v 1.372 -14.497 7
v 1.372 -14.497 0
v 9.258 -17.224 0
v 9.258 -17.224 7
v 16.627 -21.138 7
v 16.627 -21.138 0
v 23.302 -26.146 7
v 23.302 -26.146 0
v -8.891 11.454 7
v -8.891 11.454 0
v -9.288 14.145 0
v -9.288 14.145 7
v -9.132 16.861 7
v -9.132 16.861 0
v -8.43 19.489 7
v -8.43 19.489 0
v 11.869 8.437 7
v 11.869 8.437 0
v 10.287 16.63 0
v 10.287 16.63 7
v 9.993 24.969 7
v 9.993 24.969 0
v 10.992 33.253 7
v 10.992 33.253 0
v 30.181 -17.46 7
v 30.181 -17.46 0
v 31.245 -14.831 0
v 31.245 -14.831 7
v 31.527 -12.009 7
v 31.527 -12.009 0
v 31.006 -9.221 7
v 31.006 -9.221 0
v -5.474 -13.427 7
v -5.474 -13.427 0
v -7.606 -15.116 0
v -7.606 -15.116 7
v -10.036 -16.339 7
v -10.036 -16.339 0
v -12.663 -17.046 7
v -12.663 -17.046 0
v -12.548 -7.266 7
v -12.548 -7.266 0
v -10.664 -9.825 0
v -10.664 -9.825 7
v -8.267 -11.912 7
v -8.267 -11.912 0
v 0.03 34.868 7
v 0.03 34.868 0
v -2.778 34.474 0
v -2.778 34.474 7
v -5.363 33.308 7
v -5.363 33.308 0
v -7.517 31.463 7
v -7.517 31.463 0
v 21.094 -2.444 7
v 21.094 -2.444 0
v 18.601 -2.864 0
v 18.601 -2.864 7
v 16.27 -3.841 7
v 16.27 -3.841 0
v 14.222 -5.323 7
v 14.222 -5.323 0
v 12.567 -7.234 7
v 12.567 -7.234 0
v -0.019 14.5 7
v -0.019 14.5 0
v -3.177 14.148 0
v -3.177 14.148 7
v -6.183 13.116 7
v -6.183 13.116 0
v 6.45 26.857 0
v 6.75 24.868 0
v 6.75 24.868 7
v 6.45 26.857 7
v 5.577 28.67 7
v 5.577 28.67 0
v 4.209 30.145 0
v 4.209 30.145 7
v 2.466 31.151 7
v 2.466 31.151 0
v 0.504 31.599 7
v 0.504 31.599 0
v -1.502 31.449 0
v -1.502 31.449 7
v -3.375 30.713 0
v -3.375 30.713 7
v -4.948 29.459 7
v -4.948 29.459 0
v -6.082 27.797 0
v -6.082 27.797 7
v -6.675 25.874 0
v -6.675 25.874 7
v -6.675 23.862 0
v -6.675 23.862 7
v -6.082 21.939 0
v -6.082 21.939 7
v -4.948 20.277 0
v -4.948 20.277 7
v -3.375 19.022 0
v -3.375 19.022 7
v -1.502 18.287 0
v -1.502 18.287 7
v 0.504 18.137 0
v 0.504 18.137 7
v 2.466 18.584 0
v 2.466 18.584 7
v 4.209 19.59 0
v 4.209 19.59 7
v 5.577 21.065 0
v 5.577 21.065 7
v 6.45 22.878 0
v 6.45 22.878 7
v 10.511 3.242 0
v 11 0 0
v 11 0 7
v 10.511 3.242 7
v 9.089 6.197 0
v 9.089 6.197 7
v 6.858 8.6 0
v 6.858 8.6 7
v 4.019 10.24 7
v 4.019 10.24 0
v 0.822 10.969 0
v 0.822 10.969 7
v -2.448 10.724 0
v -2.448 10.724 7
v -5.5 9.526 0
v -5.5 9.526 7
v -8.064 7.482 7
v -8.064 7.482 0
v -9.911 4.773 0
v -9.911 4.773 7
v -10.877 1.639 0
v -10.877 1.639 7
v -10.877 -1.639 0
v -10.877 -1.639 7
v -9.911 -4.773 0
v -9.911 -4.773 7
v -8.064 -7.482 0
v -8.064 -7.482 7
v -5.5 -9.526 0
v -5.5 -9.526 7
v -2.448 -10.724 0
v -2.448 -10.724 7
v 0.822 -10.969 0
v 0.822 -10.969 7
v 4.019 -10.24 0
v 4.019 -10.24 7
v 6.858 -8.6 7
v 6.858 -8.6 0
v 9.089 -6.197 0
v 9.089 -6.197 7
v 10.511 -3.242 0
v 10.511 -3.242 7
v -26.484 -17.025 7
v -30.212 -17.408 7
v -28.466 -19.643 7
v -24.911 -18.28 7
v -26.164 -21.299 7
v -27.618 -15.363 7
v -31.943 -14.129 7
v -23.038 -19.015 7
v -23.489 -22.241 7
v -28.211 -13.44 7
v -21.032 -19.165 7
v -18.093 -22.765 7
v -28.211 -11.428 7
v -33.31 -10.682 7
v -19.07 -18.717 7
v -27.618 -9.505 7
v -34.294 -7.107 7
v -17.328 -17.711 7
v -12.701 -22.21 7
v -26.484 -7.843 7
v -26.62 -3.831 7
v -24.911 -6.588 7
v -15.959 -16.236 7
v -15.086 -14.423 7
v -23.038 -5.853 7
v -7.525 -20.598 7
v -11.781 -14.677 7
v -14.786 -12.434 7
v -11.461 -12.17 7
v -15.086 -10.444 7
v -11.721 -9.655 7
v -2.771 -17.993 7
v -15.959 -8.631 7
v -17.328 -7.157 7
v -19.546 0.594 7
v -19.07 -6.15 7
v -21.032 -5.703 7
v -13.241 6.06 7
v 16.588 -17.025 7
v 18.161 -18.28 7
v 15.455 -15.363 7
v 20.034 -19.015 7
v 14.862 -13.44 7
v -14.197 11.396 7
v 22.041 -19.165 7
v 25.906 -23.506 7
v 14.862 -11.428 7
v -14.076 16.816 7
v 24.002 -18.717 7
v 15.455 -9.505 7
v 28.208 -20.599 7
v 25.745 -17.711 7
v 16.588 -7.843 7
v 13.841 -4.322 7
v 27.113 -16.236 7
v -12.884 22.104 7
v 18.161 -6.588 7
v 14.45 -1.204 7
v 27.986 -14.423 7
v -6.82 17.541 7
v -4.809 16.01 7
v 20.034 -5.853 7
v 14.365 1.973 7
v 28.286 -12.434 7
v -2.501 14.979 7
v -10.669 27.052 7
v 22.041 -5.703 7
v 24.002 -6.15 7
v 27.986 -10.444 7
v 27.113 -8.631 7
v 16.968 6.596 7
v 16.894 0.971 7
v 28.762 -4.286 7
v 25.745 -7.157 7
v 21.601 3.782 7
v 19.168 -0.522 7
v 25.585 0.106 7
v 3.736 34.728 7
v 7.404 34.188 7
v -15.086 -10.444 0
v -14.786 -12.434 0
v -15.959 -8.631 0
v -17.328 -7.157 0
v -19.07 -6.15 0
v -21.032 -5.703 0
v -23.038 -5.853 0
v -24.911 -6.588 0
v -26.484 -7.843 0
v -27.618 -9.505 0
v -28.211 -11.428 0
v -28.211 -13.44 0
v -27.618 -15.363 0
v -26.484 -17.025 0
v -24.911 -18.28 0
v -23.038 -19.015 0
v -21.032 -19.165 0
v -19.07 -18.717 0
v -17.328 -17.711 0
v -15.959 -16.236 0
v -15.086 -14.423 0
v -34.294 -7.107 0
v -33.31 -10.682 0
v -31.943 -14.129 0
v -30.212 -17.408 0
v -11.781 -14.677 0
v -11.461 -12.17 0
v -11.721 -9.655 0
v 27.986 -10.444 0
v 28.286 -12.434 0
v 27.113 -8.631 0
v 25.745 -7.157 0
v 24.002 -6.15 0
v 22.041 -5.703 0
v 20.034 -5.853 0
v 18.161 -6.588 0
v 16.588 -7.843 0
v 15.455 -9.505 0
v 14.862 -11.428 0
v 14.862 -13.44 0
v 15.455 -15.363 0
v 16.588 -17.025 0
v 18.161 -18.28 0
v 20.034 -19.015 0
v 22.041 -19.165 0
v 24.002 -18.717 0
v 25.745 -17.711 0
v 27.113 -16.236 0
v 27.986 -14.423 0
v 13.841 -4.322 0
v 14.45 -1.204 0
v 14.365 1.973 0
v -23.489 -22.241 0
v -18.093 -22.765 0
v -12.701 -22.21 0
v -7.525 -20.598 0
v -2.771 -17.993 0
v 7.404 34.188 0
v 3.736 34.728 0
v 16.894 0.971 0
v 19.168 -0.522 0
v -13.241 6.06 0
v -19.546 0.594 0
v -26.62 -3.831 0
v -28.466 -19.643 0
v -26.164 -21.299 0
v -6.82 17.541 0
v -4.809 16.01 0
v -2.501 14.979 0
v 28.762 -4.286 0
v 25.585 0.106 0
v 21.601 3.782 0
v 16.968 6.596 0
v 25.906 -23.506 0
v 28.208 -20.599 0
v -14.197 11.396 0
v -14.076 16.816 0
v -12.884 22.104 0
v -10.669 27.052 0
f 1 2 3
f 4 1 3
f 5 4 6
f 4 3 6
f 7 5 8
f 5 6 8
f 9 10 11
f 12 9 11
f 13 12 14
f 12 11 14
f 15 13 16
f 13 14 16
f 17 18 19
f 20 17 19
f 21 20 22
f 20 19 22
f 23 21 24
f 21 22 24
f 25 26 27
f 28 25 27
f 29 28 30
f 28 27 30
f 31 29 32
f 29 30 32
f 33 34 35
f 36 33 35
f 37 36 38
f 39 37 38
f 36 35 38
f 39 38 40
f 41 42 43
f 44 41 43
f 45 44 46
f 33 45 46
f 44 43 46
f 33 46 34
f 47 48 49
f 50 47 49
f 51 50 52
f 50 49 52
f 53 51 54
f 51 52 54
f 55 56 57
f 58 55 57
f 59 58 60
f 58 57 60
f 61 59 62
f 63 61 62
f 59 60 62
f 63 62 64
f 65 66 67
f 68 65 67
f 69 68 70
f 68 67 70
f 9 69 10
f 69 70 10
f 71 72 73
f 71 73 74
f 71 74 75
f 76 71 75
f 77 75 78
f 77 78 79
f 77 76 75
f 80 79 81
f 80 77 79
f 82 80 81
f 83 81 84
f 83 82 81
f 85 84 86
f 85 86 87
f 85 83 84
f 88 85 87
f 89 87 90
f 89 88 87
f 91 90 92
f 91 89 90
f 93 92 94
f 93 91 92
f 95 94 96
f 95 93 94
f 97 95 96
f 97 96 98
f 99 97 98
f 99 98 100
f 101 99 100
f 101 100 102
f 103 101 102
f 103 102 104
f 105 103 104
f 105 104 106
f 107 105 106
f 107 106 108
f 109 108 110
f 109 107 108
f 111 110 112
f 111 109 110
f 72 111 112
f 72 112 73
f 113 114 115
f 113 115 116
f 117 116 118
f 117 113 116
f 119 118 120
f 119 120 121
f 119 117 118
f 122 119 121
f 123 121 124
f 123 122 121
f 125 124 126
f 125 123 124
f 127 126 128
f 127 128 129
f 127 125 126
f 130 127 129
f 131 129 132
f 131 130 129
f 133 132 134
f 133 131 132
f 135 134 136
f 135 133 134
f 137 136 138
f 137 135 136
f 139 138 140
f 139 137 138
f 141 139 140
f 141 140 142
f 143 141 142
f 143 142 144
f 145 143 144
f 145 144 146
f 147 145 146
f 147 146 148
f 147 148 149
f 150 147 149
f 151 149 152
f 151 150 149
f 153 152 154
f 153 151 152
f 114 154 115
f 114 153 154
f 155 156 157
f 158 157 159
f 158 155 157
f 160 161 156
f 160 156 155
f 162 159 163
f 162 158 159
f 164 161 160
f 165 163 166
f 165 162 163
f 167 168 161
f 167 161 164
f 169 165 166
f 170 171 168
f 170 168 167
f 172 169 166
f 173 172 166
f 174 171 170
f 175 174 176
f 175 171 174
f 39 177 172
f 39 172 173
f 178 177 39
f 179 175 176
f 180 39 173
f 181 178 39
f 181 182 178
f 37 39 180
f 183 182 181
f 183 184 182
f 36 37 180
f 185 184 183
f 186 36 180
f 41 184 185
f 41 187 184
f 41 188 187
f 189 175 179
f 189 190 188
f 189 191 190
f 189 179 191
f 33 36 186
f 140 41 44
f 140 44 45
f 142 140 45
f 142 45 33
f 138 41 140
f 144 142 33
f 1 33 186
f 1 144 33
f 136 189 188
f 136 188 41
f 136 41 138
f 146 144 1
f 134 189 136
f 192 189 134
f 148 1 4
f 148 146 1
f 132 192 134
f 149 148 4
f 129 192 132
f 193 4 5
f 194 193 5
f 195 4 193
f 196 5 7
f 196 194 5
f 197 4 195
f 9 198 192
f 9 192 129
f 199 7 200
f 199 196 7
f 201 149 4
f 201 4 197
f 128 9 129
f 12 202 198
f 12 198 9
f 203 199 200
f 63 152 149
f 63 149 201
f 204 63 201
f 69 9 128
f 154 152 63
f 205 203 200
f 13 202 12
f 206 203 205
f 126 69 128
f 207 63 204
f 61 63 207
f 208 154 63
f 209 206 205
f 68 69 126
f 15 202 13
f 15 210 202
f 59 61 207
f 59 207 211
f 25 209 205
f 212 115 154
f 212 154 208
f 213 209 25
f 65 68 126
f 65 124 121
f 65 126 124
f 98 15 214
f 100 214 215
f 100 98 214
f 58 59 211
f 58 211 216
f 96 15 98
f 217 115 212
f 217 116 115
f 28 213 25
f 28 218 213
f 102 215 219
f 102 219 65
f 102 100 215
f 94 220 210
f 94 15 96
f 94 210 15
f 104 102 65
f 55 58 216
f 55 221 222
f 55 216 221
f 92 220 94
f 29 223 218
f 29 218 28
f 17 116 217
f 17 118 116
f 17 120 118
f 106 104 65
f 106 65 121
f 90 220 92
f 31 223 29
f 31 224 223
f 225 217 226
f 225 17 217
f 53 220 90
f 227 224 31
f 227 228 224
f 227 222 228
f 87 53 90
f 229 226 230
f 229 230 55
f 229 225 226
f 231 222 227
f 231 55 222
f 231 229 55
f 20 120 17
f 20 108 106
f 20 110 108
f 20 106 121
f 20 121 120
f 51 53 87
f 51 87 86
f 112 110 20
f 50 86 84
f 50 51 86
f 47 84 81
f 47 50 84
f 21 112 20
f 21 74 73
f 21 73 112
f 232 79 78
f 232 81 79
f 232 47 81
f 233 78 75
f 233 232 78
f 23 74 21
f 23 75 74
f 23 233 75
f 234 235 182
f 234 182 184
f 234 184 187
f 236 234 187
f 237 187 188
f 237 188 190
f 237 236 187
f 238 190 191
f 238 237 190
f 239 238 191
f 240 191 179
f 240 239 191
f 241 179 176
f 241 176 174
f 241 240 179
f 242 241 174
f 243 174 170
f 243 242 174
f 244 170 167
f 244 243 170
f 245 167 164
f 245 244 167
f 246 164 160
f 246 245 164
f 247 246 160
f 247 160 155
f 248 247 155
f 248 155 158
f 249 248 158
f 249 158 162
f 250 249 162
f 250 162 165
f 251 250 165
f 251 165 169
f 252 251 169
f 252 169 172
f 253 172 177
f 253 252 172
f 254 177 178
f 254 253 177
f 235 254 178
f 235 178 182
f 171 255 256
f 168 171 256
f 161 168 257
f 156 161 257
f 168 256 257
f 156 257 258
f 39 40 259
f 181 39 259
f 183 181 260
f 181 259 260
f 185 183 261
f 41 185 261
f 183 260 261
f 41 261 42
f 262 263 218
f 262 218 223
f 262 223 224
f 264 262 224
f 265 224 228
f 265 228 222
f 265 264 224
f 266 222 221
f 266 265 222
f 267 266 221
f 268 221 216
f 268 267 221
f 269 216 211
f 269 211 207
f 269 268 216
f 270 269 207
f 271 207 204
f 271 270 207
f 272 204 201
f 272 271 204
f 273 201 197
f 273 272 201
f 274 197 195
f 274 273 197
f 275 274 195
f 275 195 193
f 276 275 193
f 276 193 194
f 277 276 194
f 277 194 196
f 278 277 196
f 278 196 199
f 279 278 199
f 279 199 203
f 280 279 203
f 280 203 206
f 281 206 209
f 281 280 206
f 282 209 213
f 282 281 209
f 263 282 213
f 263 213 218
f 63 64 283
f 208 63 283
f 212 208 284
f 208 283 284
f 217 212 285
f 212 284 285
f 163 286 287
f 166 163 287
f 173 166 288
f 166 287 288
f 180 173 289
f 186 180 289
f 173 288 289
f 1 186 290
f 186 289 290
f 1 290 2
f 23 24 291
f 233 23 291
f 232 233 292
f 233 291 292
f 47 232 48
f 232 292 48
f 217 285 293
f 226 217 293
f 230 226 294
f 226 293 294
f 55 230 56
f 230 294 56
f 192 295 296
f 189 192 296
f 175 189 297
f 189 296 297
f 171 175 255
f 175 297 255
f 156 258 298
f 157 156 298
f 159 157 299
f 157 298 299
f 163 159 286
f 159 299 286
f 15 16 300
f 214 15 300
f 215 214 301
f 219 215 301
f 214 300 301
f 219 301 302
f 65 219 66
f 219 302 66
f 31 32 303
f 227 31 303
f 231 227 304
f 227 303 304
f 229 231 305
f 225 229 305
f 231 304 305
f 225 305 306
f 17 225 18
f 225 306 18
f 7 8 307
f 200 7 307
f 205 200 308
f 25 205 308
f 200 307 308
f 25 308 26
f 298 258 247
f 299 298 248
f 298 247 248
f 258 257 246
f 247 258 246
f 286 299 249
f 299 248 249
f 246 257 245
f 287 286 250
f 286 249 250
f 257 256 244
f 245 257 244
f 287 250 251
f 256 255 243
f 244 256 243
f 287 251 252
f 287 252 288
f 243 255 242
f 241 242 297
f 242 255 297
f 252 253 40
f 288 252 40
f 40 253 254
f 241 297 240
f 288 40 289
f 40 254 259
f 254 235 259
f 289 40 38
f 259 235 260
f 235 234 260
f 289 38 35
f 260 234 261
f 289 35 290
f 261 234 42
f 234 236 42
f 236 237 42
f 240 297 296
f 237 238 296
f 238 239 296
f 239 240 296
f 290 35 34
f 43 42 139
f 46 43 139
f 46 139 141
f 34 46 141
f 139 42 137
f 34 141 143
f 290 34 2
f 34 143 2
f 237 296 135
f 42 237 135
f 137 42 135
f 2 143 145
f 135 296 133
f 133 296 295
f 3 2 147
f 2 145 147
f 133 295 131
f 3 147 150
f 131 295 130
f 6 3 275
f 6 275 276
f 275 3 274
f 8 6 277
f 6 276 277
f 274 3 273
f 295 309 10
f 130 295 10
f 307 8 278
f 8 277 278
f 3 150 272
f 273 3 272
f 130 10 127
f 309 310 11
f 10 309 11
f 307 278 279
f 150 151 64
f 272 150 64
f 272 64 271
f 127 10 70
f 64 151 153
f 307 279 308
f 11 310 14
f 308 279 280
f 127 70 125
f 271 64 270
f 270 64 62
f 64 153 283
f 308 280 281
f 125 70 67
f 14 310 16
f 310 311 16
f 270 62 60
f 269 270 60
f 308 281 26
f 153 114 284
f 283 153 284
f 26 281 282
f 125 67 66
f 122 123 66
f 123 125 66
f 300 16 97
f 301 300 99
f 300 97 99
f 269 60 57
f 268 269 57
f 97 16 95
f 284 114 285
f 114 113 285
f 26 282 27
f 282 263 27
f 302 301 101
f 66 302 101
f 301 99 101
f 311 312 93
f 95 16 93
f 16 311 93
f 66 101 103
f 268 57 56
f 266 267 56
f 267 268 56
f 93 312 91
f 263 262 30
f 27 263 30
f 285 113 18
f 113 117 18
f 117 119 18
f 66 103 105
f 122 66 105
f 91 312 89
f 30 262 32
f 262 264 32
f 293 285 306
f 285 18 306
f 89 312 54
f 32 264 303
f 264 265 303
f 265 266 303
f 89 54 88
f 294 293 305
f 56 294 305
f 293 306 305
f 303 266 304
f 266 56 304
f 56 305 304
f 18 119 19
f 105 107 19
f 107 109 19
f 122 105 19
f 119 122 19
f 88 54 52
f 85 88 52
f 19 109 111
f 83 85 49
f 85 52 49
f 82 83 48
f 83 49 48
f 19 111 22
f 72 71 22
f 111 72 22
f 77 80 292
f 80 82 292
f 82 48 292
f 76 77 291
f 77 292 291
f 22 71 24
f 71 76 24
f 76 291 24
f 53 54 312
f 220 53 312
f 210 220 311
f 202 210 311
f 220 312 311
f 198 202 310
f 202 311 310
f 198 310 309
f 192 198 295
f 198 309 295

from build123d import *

# Parameters (mm, degrees)
F0_R     = 6.75
F0_R_2   = 11
F1_DEPTH = 7


with BuildPart() as f1:
    # F0 (on Top) → F1 (new body)
    with BuildSketch(Plane.XY):
        with BuildLine():
            ThreePointArc((0.0303634628, 34.8677483042), (-4.1124282103, 33.9830527199), (-7.5172278162, 31.4625867377))
            ThreePointArc((-7.5172278162, 31.4625867377), (-13.6121821661, 19.4898899069), (-13.2411988753, 6.0602097422))
            ThreePointArc((-13.2411988753, 6.0602097422), (-22.9967779432, -1.7556709932), (-34.2936443309, -7.1073178834))
            ThreePointArc((-34.2936443309, -7.1073178834), (-32.6733499934, -12.4241997031), (-30.2115375356, -17.407578622))
            ThreePointArc((-30.2115375356, -17.407578622), (-27.3739728485, -20.5529936613), (-23.4887854755, -22.2414036237))
            ThreePointArc((-23.4887854755, -22.2414036237), (-10.0726486933, -21.5334405102), (1.3723038486, -14.4973194736))
            ThreePointArc((1.3723038486, -14.4973194736), (13.0188446523, -19.0379584074), (23.3019400052, -26.1455082372))
            ThreePointArc((23.3019400052, -26.1455082372), (27.0963475613, -22.0838512694), (30.1811740728, -17.4601696823))
            ThreePointArc((30.1811740728, -17.4601696823), (31.4864010588, -13.4300590586), (31.0060132917, -9.221183114))
            ThreePointArc((31.0060132917, -9.221183114), (23.6848308594, 2.0435506033), (11.8688950266, 8.4371097315))
            ThreePointArc((11.8688950266, 8.4371097315), (9.9779332908, 20.7936294005), (10.9917043257, 33.2528261205))
            ThreePointArc((10.9917043257, 33.2528261205), (5.5770024321, 34.5080509726), (0.0303634628, 34.8677483042))
        make_face()
        with Locations((-21.5361416876, -12.4338972007)):
            Circle(F0_R, mode=Mode.SUBTRACT)
        with BuildLine():
            ThreePointArc((-12.6630806003, -17.045706709), (-11.4611852349, -12.169559613), (-12.5478578488, -7.2664477846))
            ThreePointArc((-12.5478578488, -7.2664477846), (-9.5228828701, -10.9345645475), (-5.47403134, -13.4270242753))
            ThreePointArc((-5.47403134, -13.4270242753), (-8.7901592188, -15.7894419215), (-12.6630806003, -17.045706709))
        make_face(mode=Mode.SUBTRACT)
        with BuildLine():
            ThreePointArc((1.4389157248, -14.428427549), (1.4056400908, -14.4629028124), (1.3723038486, -14.4973194736))
            ThreePointArc((1.3723038486, -14.4973194736), (1.2826311608, -14.4740053694), (1.1929184258, -14.4508458448))
            ThreePointArc((1.1929184258, -14.4508458448), (1.3159648149, -14.4401605464), (1.4389157248, -14.428427549))
        make_face(mode=Mode.SUBTRACT)
        with Locations((21.5361416876, -12.4338972007)):
            Circle(F0_R, mode=Mode.SUBTRACT)
        Circle(F0_R_2, mode=Mode.SUBTRACT)
        with BuildLine():
            ThreePointArc((14.3651597896, 1.9728619361), (18.069137425, 0.282219774), (21.0935553356, -2.4436961356))
            ThreePointArc((21.0935553356, -2.4436961356), (16.2697403952, -3.8408977644), (12.5668573011, -7.2335397678))
            ThreePointArc((12.5668573011, -7.2335397678), (14.2310521125, -2.779776209), (14.3651597896, 1.9728619361))
        make_face(mode=Mode.SUBTRACT)
        with BuildLine():
            ThreePointArc((-8.4304747353, 19.4894028445), (-4.8085551602, 16.0104573774), (-0.0189994523, 14.4999875524))
            ThreePointArc((-0.0189994523, 14.4999875524), (-4.7081692424, 13.7143407565), (-8.8911284496, 11.4541623392))
            ThreePointArc((-8.8911284496, 11.4541623392), (-9.2789782062, 15.5072221475), (-8.4304747353, 19.4894028445))
        make_face(mode=Mode.SUBTRACT)
        with Locations((0, 24.8677944013)):
            Circle(F0_R, mode=Mode.SUBTRACT)
        with BuildLine():
            ThreePointArc((1.1929184258, -14.4508458448), (1.2826311608, -14.4740053694), (1.3723038486, -14.4973194736))
            ThreePointArc((1.3723038486, -14.4973194736), (1.4056400908, -14.4629028124), (1.4389157248, -14.428427549))
            ThreePointArc((1.4389157248, -14.428427549), (1.3159648149, -14.4401605464), (1.1929184258, -14.4508458448))
        make_face()
    extrude(amount=F1_DEPTH)


solid = f1.part
